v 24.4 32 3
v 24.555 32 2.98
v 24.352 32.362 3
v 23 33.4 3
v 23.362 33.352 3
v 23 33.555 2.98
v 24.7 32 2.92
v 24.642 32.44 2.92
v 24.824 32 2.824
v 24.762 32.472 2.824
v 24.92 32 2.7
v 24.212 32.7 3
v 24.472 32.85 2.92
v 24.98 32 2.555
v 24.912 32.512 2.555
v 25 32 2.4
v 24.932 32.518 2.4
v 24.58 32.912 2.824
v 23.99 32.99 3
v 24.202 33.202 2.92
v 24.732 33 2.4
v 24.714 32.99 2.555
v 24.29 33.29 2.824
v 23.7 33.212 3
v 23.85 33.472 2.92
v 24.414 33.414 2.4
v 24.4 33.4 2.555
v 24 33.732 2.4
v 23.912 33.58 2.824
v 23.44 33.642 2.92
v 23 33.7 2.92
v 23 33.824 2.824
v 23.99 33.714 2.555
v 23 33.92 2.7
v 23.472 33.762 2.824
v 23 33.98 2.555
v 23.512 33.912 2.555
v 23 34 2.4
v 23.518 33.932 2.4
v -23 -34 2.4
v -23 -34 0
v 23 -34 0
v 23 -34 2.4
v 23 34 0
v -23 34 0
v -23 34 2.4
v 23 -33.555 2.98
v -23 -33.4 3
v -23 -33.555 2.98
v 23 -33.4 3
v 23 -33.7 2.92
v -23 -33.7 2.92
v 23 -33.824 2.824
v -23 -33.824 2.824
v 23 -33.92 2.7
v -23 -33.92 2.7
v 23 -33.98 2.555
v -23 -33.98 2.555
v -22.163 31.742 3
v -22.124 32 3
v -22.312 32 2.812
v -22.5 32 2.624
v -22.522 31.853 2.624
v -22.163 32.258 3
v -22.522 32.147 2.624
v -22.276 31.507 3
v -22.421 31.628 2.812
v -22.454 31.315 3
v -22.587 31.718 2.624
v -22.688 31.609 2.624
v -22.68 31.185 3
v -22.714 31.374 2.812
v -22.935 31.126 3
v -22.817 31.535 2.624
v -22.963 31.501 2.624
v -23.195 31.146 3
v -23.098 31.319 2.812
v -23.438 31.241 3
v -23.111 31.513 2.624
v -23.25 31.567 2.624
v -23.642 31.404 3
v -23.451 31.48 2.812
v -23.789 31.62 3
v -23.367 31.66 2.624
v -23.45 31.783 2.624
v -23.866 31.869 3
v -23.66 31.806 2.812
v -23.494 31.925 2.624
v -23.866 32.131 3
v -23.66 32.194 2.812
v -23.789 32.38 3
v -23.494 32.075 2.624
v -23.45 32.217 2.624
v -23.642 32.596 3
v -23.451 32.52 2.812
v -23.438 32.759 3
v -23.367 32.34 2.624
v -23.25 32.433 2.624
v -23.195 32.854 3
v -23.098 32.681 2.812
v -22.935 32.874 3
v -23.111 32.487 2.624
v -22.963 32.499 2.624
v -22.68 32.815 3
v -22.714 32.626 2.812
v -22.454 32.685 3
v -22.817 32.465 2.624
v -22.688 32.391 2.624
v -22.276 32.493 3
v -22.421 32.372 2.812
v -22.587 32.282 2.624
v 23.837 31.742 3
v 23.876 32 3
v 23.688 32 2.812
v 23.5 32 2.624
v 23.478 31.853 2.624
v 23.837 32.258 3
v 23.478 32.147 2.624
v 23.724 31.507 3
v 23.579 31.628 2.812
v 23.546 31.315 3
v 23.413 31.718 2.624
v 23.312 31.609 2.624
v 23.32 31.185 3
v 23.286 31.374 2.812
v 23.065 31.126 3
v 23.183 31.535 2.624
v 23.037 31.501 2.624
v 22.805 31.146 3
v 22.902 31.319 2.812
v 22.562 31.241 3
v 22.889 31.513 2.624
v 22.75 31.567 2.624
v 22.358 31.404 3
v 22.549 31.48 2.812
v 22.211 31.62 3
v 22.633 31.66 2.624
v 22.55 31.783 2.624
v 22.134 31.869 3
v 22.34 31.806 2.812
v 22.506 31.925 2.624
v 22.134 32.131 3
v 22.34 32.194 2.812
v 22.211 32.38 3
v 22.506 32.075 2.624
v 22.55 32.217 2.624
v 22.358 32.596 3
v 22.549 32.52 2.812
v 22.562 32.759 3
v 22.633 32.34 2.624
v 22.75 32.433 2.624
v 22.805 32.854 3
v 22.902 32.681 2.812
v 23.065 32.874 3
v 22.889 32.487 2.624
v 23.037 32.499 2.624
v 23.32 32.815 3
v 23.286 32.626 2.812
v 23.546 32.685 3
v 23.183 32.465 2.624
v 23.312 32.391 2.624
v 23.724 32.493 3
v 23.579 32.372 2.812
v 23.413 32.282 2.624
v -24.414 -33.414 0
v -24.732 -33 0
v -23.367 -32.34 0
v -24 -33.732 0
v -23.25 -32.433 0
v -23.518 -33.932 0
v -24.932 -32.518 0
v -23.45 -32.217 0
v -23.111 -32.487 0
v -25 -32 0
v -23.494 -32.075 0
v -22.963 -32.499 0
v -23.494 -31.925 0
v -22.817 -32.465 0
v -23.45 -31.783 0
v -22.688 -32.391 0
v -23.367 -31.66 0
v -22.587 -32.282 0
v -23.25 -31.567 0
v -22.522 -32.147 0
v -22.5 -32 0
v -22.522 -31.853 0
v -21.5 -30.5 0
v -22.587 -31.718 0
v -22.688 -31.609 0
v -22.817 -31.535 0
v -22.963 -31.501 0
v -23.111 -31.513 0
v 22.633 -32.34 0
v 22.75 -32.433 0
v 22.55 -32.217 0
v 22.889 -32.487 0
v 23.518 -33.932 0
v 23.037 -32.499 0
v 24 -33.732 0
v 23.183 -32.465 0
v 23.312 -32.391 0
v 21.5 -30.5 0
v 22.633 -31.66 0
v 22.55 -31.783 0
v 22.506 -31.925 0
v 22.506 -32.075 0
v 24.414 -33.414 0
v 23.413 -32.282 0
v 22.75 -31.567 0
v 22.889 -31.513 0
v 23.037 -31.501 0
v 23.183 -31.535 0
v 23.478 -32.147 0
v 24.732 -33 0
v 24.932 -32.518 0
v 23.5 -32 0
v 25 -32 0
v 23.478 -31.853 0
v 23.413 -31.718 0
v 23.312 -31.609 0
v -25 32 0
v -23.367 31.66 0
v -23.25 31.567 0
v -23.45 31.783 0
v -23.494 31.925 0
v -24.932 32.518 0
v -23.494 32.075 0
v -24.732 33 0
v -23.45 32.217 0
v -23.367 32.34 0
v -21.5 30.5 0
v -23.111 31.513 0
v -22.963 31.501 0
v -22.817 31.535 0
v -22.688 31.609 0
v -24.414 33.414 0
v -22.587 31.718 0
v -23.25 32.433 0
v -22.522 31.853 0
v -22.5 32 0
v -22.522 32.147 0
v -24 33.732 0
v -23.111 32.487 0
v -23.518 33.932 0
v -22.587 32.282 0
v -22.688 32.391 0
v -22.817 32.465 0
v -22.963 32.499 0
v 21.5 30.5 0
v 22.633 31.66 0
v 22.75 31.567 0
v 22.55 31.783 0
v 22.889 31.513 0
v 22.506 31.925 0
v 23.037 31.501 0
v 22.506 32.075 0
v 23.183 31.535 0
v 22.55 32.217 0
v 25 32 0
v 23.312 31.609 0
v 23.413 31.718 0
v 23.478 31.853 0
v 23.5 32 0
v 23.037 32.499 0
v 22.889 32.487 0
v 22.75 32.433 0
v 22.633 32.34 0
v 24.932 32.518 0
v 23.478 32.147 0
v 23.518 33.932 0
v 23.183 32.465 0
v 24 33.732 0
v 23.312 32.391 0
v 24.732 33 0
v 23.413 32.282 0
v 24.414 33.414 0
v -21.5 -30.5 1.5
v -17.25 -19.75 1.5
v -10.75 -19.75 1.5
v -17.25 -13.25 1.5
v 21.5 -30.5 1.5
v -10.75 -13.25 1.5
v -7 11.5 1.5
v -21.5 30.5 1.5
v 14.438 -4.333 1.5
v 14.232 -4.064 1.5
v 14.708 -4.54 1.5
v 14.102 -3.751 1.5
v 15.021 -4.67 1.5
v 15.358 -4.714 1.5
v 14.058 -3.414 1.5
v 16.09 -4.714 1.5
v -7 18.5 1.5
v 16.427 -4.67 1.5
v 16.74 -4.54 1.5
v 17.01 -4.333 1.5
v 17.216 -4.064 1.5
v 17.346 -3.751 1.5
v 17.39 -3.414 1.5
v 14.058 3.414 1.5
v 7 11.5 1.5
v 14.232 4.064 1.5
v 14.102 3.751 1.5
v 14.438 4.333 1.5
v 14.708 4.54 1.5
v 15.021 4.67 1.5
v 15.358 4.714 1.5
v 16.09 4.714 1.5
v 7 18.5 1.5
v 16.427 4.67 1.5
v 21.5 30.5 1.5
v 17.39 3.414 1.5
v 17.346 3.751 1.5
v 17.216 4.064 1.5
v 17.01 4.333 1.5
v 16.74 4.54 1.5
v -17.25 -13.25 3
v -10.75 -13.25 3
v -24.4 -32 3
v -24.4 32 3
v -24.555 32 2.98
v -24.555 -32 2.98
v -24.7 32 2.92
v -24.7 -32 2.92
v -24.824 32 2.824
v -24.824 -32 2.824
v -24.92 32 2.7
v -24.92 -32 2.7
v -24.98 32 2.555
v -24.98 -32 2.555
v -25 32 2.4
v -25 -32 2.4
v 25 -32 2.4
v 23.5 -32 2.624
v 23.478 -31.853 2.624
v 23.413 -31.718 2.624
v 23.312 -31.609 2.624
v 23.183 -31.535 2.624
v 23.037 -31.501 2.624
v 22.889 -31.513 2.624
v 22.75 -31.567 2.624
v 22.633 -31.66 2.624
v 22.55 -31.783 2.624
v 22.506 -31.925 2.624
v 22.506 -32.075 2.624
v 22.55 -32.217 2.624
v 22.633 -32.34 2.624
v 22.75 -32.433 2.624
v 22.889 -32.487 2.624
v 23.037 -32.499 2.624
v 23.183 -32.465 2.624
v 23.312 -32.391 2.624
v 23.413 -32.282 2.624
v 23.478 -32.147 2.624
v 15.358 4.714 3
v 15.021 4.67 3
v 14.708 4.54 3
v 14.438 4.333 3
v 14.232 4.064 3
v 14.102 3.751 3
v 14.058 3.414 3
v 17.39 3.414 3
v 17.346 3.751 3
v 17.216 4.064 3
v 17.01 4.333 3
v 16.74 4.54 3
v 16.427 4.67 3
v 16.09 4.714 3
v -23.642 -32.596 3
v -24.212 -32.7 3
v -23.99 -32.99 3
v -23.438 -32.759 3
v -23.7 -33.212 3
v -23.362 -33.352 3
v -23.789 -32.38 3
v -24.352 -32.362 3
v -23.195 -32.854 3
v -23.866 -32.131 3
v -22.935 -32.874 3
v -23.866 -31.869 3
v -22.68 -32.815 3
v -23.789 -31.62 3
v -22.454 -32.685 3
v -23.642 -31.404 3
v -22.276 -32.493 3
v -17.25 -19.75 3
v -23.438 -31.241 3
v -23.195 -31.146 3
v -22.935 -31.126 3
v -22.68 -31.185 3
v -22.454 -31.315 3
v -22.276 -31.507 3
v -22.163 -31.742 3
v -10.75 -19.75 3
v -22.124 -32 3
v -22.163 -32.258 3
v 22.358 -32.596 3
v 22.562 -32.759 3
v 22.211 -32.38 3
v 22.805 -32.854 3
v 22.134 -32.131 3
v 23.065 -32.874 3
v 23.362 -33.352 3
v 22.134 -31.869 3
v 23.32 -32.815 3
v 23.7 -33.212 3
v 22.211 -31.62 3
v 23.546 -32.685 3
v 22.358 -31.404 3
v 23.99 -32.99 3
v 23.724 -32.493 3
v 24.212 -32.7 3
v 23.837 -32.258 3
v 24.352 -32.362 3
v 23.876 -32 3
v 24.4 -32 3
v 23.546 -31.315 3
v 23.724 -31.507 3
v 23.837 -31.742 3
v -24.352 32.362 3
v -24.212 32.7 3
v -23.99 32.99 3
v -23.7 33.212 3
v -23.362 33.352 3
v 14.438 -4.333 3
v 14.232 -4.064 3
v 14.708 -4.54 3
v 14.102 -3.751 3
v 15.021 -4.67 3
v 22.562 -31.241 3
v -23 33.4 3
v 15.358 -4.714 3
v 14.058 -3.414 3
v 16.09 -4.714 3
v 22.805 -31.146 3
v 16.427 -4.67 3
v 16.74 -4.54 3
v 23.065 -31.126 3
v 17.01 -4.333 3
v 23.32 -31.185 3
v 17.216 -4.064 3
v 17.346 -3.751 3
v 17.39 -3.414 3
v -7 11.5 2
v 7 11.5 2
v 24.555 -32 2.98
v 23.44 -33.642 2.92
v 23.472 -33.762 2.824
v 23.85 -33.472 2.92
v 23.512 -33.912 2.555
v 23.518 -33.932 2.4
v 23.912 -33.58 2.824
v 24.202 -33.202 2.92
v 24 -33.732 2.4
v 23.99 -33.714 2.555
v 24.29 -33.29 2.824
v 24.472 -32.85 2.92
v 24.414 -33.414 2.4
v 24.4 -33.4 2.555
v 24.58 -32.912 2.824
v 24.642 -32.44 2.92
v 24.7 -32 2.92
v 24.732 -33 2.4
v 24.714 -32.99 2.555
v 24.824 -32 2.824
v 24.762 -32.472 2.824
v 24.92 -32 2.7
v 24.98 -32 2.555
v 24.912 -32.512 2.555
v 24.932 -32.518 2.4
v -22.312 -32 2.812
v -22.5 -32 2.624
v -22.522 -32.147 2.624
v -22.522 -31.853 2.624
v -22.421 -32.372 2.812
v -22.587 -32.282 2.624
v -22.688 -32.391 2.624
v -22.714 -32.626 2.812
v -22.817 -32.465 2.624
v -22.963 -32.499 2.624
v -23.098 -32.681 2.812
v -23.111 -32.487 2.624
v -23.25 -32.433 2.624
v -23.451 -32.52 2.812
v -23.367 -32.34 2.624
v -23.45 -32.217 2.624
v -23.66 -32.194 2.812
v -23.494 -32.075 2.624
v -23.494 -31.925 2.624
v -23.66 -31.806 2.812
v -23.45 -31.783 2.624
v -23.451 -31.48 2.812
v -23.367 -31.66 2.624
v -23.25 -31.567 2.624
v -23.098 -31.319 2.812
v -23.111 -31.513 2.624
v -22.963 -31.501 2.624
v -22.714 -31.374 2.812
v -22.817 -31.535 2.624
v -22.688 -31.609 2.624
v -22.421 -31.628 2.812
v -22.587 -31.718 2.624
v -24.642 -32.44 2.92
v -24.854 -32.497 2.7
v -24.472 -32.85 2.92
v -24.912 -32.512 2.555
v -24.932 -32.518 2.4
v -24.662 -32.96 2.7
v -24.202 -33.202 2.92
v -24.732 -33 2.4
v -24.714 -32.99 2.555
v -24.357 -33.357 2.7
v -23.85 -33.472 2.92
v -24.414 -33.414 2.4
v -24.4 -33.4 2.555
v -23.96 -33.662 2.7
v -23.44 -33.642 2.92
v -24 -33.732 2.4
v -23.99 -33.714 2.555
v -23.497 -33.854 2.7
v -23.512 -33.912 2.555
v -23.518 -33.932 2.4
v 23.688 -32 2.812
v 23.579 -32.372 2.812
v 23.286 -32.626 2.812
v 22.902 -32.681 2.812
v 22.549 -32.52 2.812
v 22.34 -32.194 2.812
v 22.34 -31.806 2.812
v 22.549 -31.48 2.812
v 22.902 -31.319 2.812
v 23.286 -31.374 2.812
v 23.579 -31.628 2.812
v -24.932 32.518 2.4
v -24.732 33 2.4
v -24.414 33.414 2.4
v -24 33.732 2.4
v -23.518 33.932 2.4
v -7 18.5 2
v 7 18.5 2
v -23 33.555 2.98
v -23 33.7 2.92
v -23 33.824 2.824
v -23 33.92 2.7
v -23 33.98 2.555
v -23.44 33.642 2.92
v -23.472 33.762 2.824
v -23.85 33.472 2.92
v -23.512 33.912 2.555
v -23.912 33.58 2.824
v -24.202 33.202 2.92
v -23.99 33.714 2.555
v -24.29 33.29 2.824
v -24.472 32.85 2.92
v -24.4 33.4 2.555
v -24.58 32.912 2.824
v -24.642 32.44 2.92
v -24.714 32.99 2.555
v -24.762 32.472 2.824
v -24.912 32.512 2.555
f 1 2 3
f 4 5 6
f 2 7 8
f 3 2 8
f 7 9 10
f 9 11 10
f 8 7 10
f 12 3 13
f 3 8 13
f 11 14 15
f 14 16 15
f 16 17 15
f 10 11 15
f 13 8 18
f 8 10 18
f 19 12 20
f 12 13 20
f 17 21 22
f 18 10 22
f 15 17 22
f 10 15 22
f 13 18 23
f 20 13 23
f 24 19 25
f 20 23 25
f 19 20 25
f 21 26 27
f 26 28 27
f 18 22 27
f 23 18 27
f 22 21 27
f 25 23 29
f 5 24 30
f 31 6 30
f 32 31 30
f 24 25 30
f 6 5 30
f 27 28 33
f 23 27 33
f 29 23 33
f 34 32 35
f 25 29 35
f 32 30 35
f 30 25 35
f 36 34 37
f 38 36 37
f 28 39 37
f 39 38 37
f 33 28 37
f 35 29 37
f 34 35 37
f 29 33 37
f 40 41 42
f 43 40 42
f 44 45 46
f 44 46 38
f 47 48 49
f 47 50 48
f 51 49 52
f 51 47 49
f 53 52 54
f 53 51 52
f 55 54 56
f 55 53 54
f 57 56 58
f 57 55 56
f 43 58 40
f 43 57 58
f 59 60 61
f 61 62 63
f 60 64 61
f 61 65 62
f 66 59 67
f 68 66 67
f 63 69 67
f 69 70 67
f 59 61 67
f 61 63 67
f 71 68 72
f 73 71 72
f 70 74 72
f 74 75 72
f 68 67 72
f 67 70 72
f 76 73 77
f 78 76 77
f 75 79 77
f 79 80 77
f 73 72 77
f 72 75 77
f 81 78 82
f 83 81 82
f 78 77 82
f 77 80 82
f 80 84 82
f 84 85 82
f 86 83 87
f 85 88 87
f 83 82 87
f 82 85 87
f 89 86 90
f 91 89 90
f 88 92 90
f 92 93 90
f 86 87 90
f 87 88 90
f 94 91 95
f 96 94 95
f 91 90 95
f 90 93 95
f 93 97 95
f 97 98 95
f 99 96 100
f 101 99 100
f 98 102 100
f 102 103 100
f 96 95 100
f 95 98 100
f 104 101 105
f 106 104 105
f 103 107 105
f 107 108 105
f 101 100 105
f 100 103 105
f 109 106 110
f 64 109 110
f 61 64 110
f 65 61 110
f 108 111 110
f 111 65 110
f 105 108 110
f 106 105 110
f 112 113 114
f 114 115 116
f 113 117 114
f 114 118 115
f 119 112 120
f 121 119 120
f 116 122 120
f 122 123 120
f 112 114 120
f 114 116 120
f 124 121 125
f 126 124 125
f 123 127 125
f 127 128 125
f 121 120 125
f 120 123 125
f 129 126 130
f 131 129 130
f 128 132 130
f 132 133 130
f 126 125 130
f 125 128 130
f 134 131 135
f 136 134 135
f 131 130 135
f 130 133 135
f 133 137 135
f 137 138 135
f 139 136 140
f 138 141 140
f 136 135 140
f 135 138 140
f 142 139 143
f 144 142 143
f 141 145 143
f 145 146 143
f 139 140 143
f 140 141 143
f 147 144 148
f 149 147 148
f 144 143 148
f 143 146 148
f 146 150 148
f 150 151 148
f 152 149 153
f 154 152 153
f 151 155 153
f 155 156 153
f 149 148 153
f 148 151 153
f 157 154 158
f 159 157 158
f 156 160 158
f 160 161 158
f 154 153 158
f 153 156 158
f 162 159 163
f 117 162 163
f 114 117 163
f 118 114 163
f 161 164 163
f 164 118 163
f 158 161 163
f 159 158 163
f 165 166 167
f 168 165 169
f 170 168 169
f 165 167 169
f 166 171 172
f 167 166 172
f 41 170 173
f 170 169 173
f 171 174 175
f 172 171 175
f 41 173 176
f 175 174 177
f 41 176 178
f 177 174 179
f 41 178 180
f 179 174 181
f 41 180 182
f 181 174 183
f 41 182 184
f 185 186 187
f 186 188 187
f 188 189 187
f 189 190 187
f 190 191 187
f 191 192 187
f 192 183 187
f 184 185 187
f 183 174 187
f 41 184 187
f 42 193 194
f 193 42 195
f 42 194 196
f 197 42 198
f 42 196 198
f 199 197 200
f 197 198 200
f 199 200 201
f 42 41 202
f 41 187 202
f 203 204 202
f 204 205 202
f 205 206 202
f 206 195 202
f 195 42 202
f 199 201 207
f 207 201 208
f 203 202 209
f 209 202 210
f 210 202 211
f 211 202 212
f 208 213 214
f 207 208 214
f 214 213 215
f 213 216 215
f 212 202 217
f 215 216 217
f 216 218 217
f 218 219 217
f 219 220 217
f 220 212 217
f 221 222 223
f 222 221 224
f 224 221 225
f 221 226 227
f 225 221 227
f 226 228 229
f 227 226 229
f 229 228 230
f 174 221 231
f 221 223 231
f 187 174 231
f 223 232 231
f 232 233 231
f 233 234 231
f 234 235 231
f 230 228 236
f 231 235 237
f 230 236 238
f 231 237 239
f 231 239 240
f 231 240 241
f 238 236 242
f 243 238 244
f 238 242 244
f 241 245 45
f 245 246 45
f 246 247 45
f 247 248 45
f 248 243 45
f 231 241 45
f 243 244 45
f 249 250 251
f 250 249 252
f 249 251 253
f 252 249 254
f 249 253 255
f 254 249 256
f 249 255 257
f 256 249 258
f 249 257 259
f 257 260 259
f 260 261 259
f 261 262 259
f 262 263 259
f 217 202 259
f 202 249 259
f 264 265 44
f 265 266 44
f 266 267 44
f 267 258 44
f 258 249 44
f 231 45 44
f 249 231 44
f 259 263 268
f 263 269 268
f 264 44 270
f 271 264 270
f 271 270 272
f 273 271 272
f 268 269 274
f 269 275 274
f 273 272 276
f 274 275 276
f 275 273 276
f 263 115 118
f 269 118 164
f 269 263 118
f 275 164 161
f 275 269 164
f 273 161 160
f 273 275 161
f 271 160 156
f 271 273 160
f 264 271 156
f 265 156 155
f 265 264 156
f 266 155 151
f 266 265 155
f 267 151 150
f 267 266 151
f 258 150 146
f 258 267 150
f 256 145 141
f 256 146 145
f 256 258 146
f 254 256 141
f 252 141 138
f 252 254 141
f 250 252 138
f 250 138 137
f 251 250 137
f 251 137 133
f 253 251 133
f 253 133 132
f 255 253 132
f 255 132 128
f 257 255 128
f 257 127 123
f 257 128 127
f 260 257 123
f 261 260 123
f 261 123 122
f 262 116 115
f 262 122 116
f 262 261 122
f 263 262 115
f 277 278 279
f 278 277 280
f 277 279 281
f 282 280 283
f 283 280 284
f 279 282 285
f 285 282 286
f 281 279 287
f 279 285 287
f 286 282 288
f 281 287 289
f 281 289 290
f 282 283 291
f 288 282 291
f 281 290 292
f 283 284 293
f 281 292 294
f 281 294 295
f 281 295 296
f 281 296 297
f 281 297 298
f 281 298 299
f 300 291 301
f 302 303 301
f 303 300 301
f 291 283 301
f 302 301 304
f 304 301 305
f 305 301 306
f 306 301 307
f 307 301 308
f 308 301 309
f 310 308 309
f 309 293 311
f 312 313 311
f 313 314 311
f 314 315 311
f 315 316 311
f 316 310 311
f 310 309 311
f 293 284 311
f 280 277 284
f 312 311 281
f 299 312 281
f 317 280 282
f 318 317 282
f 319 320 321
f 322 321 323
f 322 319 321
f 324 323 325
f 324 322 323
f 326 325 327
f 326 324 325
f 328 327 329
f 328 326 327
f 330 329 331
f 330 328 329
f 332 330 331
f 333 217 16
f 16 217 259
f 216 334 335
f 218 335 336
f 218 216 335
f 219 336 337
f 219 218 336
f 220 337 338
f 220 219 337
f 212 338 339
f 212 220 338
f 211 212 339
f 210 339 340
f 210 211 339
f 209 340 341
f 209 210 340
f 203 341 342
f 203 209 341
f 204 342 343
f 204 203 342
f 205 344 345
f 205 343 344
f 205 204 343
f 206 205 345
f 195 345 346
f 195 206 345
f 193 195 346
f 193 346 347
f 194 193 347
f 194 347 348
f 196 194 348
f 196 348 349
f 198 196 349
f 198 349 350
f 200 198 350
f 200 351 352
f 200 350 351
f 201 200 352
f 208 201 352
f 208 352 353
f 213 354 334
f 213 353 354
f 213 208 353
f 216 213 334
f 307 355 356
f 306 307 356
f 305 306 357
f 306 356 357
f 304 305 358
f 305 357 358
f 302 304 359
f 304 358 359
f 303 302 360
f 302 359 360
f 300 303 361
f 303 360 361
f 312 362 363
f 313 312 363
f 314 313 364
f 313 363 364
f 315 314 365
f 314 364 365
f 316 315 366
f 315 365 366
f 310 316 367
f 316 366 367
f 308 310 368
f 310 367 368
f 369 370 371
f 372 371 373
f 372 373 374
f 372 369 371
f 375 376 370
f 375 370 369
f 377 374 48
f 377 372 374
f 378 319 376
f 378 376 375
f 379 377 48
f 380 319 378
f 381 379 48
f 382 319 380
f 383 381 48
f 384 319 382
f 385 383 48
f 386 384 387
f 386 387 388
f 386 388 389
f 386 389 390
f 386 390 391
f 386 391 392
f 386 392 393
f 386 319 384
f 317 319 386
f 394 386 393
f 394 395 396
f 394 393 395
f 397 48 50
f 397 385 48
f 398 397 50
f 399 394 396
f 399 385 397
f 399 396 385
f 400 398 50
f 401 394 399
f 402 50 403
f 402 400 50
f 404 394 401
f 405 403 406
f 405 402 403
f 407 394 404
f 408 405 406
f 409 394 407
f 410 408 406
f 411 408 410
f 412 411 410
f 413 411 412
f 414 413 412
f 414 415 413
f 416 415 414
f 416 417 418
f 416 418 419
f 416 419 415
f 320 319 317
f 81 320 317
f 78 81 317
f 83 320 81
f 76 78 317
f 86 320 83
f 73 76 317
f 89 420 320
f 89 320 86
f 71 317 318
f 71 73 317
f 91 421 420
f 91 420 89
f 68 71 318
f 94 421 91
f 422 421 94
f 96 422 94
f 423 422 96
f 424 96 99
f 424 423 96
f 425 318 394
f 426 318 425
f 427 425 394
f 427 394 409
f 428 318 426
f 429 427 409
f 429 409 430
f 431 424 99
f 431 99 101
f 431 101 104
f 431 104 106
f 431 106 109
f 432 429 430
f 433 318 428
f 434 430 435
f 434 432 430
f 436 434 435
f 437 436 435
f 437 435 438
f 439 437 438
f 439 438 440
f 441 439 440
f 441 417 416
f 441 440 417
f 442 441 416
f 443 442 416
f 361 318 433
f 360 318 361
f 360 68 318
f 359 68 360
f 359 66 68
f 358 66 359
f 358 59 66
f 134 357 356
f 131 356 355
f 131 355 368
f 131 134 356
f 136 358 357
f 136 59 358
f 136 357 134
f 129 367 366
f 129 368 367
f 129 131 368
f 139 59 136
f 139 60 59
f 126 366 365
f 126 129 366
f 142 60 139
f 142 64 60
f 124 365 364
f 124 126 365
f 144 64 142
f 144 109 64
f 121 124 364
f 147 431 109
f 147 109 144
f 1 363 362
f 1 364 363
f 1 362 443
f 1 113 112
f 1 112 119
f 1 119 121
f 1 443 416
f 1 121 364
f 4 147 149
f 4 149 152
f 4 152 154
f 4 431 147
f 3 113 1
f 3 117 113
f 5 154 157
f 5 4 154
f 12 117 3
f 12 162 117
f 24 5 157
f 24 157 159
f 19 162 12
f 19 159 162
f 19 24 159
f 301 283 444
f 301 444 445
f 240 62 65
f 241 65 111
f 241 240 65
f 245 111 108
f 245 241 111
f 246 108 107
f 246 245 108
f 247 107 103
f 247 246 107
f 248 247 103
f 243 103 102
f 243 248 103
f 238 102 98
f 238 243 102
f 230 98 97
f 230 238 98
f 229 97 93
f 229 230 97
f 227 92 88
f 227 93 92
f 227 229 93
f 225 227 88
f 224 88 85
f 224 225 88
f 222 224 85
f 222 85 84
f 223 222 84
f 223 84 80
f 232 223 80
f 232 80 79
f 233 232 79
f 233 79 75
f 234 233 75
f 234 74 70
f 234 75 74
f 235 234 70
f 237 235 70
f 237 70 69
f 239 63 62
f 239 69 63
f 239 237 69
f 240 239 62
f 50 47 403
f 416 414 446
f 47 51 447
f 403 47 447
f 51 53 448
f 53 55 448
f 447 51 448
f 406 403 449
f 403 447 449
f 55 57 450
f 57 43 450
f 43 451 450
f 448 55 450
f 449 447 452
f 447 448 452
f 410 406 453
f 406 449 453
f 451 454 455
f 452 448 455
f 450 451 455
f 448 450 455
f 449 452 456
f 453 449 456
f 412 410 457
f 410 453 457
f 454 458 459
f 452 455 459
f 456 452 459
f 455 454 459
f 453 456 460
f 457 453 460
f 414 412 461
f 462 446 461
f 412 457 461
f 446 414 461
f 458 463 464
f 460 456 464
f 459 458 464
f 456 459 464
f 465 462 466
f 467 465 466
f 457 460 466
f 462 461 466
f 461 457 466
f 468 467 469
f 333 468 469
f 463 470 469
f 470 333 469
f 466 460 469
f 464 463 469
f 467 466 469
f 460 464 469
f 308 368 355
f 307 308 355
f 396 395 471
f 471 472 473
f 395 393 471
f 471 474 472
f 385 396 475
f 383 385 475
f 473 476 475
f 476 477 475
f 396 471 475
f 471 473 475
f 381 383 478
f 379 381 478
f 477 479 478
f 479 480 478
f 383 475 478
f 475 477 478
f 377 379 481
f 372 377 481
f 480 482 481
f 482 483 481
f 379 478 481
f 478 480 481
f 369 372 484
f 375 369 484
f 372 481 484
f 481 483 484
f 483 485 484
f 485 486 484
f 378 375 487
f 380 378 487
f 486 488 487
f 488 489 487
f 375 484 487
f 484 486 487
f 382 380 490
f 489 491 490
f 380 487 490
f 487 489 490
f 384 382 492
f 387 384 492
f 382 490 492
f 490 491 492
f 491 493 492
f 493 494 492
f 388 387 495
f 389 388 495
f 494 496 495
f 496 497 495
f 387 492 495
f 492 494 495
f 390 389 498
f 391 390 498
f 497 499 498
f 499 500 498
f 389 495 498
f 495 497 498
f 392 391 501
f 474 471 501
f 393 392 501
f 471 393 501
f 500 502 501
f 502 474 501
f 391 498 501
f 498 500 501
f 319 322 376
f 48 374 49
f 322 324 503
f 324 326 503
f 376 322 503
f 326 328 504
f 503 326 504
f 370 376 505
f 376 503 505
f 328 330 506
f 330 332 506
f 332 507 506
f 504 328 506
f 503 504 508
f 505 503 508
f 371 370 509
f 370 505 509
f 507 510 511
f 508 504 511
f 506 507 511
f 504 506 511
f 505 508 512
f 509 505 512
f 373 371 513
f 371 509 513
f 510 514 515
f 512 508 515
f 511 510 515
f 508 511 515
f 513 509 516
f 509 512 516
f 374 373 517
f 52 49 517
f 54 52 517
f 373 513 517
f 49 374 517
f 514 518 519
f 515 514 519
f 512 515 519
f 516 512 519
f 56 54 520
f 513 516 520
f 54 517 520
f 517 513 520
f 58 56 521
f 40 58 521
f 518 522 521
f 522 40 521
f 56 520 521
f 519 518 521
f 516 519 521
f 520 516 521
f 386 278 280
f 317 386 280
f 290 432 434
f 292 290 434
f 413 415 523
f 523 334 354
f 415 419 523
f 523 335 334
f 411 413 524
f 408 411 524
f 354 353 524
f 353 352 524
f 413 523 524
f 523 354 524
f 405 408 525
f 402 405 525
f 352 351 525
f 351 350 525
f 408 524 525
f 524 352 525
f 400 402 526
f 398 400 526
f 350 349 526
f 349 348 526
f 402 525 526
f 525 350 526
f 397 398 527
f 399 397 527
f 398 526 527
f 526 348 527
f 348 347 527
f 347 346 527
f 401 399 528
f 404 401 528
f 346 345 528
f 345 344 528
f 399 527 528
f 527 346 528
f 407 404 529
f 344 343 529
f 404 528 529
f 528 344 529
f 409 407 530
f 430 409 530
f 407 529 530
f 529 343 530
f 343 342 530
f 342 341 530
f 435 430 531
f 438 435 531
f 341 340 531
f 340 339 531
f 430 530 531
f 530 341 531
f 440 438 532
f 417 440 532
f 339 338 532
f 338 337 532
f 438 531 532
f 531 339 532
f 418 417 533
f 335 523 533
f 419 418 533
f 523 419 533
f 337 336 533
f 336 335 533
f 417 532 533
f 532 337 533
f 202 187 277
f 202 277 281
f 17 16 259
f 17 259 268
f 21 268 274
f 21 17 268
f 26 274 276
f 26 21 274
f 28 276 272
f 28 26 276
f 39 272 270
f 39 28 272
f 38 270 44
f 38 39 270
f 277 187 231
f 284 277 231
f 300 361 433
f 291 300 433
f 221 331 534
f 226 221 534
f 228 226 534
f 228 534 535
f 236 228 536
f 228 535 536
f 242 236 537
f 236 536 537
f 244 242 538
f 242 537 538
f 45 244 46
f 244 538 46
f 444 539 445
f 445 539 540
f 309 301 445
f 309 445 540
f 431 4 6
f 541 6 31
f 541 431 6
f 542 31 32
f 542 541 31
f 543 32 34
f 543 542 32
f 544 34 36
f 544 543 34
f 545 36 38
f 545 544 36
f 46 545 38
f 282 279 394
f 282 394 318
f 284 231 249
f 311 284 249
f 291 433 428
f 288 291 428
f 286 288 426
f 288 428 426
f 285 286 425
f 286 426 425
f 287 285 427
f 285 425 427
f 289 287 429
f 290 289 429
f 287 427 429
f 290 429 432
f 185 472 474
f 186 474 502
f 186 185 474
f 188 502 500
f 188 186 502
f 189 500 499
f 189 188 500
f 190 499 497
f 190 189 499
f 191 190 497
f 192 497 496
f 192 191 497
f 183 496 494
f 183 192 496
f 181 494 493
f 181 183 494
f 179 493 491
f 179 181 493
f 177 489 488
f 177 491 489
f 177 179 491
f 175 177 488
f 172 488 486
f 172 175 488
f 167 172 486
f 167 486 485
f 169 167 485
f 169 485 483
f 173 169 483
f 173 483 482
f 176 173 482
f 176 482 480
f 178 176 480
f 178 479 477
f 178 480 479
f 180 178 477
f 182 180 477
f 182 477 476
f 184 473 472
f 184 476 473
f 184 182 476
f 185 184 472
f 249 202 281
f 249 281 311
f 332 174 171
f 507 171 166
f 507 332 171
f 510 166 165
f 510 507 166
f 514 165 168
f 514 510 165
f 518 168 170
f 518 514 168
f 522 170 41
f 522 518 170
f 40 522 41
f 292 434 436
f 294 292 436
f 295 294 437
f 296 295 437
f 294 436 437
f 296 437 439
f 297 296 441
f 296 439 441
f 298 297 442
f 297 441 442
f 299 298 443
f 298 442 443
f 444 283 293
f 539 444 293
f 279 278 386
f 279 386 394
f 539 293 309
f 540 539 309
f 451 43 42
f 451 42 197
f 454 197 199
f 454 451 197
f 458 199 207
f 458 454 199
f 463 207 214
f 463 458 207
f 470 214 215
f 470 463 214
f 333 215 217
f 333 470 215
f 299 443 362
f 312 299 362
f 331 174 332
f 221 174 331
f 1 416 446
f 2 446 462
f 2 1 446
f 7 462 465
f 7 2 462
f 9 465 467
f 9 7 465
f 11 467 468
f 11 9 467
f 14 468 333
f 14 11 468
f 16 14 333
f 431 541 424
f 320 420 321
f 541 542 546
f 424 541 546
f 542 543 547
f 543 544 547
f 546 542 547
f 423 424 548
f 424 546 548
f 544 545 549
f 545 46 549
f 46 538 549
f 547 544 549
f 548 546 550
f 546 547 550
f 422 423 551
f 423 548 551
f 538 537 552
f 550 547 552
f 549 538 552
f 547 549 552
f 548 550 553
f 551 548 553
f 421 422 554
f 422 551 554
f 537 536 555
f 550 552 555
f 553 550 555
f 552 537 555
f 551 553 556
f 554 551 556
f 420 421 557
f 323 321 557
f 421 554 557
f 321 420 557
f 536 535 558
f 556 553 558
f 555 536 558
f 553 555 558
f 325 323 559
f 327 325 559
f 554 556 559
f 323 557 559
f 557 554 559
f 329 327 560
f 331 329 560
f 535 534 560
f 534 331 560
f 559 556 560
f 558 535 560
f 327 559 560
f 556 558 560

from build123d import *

# Parameters (mm, degrees)
SKETCH_1_W          = 50
SKETCH_1_H          = 68
EXTRUDE_1_DEPTH     = 3
FILLET_1_R          = 2
SKETCH_1_5_R        = 0.5
CUT_EXTRUDE_1_DEPTH = 43.308391603
SKETCH_1_6_W        = 43
SKETCH_1_6_H        = 61
CUT_EXTRUDE_2_DEPTH = 1.5
CHAMFER_1_SIZE      = 0.376
CUT_EXTRUDE_3_DEPTH = 43.308391603
SKETCH_6_W          = 14
SKETCH_6_H          = 7
CUT_EXTRUDE_4_DEPTH = 2
SKETCH_6_3_W        = 6.5
SKETCH_6_3_H        = 6.5
CUT_EXTRUDE_5_DEPTH = 43.308391603
FILLET_2_R          = 0.6


with BuildPart() as part:
    # 草图1 → 凸台-拉伸1 (new body)
    with BuildSketch(Plane.XY):
        Rectangle(SKETCH_1_W, SKETCH_1_H)
    extrude(amount=EXTRUDE_1_DEPTH)

    # 圆角1
    fillet_1_edges = [part.edges().sort_by_distance(p)[0] for p in [
        (-25, -34, 1.5),
        (-25, 34, 1.5),
        (25, 34, 1.5),
        (25, -34, 1.5),
    ]]
    fillet(fillet_1_edges, radius=FILLET_1_R)

    # 草图1<5> → 切除-拉伸1 (cut, through all)
    with BuildSketch(Plane.XY):
        with Locations((23, 32)):
            Circle(SKETCH_1_5_R)
        with Locations((-23, 32)):
            Circle(SKETCH_1_5_R)
        with Locations((-23, -32)):
            Circle(SKETCH_1_5_R)
        with Locations((23, -32)):
            Circle(SKETCH_1_5_R)
    extrude(amount=CUT_EXTRUDE_1_DEPTH, mode=Mode.SUBTRACT)

    # 草图1<6> → 切除-拉伸2 (cut)
    with BuildSketch(Plane.XY):
        Rectangle(SKETCH_1_6_W, SKETCH_1_6_H)
    extrude(amount=CUT_EXTRUDE_2_DEPTH, mode=Mode.SUBTRACT)

    # 倒角1
    chamfer_1_edges = [part.edges().sort_by_distance(p)[0] for p in [
        (22.5, -32, 3),
        (-23.5, -32, 3),
        (-23.5, 32, 3),
        (22.5, 32, 3),
    ]]
    chamfer(chamfer_1_edges, length=CHAMFER_1_SIZE)

    # 草图5 → 切除-拉伸3 (cut, through all)
    with BuildSketch(Plane.XY.offset(3)):
        with BuildLine():
            Line((15.357692994, -4.714172352), (16.090307006, -4.714172352))
            ThreePointArc((16.090307006, -4.714172352), (17.009545821, -4.333411167), (17.390307006, -3.414172352))
            Line((17.390307006, -3.414172352), (17.390307006, 3.414172352))
            ThreePointArc((17.390307006, 3.414172352), (17.009545821, 4.333411167), (16.090307006, 4.714172352))
            Line((16.090307006, 4.714172352), (15.357692994, 4.714172352))
            ThreePointArc((15.357692994, 4.714172352), (14.438454179, 4.333411167), (14.057692994, 3.414172352))
            Line((14.057692994, 3.414172352), (14.057692994, -3.414172352))
            ThreePointArc((14.057692994, -3.414172352), (14.438454179, -4.333411167), (15.357692994, -4.714172352))
        make_face()
    extrude(amount=-CUT_EXTRUDE_3_DEPTH, mode=Mode.SUBTRACT)

    # 草图6 → 切除-拉伸4 (cut)
    with BuildSketch(Plane.XY):
        with Locations((0, 15)):
            Rectangle(SKETCH_6_W, SKETCH_6_H)
    extrude(amount=CUT_EXTRUDE_4_DEPTH, mode=Mode.SUBTRACT)

    # 草图6<3> → 切除-拉伸5 (cut, through all)
    with BuildSketch(Plane.XY):
        with Locations((-14, -16.5)):
            Rectangle(SKETCH_6_3_W, SKETCH_6_3_H)
    extrude(amount=CUT_EXTRUDE_5_DEPTH, mode=Mode.SUBTRACT)

    # 圆角2
    fillet_2_edges = [part.edges().sort_by_distance(p)[0] for p in [
        (0, -34, 3),
        (-25, 0, 3),
        (25, 0, 3),
        (0, 34, 3),
        (-24.414213562, 33.414213562, 3),
        (24.414213562, 33.414213562, 3),
        (24.414213562, -33.414213562, 3),
        (-24.414213562, -33.414213562, 3),
    ]]
    fillet(fillet_2_edges, radius=FILLET_2_R)


solid = part.part
